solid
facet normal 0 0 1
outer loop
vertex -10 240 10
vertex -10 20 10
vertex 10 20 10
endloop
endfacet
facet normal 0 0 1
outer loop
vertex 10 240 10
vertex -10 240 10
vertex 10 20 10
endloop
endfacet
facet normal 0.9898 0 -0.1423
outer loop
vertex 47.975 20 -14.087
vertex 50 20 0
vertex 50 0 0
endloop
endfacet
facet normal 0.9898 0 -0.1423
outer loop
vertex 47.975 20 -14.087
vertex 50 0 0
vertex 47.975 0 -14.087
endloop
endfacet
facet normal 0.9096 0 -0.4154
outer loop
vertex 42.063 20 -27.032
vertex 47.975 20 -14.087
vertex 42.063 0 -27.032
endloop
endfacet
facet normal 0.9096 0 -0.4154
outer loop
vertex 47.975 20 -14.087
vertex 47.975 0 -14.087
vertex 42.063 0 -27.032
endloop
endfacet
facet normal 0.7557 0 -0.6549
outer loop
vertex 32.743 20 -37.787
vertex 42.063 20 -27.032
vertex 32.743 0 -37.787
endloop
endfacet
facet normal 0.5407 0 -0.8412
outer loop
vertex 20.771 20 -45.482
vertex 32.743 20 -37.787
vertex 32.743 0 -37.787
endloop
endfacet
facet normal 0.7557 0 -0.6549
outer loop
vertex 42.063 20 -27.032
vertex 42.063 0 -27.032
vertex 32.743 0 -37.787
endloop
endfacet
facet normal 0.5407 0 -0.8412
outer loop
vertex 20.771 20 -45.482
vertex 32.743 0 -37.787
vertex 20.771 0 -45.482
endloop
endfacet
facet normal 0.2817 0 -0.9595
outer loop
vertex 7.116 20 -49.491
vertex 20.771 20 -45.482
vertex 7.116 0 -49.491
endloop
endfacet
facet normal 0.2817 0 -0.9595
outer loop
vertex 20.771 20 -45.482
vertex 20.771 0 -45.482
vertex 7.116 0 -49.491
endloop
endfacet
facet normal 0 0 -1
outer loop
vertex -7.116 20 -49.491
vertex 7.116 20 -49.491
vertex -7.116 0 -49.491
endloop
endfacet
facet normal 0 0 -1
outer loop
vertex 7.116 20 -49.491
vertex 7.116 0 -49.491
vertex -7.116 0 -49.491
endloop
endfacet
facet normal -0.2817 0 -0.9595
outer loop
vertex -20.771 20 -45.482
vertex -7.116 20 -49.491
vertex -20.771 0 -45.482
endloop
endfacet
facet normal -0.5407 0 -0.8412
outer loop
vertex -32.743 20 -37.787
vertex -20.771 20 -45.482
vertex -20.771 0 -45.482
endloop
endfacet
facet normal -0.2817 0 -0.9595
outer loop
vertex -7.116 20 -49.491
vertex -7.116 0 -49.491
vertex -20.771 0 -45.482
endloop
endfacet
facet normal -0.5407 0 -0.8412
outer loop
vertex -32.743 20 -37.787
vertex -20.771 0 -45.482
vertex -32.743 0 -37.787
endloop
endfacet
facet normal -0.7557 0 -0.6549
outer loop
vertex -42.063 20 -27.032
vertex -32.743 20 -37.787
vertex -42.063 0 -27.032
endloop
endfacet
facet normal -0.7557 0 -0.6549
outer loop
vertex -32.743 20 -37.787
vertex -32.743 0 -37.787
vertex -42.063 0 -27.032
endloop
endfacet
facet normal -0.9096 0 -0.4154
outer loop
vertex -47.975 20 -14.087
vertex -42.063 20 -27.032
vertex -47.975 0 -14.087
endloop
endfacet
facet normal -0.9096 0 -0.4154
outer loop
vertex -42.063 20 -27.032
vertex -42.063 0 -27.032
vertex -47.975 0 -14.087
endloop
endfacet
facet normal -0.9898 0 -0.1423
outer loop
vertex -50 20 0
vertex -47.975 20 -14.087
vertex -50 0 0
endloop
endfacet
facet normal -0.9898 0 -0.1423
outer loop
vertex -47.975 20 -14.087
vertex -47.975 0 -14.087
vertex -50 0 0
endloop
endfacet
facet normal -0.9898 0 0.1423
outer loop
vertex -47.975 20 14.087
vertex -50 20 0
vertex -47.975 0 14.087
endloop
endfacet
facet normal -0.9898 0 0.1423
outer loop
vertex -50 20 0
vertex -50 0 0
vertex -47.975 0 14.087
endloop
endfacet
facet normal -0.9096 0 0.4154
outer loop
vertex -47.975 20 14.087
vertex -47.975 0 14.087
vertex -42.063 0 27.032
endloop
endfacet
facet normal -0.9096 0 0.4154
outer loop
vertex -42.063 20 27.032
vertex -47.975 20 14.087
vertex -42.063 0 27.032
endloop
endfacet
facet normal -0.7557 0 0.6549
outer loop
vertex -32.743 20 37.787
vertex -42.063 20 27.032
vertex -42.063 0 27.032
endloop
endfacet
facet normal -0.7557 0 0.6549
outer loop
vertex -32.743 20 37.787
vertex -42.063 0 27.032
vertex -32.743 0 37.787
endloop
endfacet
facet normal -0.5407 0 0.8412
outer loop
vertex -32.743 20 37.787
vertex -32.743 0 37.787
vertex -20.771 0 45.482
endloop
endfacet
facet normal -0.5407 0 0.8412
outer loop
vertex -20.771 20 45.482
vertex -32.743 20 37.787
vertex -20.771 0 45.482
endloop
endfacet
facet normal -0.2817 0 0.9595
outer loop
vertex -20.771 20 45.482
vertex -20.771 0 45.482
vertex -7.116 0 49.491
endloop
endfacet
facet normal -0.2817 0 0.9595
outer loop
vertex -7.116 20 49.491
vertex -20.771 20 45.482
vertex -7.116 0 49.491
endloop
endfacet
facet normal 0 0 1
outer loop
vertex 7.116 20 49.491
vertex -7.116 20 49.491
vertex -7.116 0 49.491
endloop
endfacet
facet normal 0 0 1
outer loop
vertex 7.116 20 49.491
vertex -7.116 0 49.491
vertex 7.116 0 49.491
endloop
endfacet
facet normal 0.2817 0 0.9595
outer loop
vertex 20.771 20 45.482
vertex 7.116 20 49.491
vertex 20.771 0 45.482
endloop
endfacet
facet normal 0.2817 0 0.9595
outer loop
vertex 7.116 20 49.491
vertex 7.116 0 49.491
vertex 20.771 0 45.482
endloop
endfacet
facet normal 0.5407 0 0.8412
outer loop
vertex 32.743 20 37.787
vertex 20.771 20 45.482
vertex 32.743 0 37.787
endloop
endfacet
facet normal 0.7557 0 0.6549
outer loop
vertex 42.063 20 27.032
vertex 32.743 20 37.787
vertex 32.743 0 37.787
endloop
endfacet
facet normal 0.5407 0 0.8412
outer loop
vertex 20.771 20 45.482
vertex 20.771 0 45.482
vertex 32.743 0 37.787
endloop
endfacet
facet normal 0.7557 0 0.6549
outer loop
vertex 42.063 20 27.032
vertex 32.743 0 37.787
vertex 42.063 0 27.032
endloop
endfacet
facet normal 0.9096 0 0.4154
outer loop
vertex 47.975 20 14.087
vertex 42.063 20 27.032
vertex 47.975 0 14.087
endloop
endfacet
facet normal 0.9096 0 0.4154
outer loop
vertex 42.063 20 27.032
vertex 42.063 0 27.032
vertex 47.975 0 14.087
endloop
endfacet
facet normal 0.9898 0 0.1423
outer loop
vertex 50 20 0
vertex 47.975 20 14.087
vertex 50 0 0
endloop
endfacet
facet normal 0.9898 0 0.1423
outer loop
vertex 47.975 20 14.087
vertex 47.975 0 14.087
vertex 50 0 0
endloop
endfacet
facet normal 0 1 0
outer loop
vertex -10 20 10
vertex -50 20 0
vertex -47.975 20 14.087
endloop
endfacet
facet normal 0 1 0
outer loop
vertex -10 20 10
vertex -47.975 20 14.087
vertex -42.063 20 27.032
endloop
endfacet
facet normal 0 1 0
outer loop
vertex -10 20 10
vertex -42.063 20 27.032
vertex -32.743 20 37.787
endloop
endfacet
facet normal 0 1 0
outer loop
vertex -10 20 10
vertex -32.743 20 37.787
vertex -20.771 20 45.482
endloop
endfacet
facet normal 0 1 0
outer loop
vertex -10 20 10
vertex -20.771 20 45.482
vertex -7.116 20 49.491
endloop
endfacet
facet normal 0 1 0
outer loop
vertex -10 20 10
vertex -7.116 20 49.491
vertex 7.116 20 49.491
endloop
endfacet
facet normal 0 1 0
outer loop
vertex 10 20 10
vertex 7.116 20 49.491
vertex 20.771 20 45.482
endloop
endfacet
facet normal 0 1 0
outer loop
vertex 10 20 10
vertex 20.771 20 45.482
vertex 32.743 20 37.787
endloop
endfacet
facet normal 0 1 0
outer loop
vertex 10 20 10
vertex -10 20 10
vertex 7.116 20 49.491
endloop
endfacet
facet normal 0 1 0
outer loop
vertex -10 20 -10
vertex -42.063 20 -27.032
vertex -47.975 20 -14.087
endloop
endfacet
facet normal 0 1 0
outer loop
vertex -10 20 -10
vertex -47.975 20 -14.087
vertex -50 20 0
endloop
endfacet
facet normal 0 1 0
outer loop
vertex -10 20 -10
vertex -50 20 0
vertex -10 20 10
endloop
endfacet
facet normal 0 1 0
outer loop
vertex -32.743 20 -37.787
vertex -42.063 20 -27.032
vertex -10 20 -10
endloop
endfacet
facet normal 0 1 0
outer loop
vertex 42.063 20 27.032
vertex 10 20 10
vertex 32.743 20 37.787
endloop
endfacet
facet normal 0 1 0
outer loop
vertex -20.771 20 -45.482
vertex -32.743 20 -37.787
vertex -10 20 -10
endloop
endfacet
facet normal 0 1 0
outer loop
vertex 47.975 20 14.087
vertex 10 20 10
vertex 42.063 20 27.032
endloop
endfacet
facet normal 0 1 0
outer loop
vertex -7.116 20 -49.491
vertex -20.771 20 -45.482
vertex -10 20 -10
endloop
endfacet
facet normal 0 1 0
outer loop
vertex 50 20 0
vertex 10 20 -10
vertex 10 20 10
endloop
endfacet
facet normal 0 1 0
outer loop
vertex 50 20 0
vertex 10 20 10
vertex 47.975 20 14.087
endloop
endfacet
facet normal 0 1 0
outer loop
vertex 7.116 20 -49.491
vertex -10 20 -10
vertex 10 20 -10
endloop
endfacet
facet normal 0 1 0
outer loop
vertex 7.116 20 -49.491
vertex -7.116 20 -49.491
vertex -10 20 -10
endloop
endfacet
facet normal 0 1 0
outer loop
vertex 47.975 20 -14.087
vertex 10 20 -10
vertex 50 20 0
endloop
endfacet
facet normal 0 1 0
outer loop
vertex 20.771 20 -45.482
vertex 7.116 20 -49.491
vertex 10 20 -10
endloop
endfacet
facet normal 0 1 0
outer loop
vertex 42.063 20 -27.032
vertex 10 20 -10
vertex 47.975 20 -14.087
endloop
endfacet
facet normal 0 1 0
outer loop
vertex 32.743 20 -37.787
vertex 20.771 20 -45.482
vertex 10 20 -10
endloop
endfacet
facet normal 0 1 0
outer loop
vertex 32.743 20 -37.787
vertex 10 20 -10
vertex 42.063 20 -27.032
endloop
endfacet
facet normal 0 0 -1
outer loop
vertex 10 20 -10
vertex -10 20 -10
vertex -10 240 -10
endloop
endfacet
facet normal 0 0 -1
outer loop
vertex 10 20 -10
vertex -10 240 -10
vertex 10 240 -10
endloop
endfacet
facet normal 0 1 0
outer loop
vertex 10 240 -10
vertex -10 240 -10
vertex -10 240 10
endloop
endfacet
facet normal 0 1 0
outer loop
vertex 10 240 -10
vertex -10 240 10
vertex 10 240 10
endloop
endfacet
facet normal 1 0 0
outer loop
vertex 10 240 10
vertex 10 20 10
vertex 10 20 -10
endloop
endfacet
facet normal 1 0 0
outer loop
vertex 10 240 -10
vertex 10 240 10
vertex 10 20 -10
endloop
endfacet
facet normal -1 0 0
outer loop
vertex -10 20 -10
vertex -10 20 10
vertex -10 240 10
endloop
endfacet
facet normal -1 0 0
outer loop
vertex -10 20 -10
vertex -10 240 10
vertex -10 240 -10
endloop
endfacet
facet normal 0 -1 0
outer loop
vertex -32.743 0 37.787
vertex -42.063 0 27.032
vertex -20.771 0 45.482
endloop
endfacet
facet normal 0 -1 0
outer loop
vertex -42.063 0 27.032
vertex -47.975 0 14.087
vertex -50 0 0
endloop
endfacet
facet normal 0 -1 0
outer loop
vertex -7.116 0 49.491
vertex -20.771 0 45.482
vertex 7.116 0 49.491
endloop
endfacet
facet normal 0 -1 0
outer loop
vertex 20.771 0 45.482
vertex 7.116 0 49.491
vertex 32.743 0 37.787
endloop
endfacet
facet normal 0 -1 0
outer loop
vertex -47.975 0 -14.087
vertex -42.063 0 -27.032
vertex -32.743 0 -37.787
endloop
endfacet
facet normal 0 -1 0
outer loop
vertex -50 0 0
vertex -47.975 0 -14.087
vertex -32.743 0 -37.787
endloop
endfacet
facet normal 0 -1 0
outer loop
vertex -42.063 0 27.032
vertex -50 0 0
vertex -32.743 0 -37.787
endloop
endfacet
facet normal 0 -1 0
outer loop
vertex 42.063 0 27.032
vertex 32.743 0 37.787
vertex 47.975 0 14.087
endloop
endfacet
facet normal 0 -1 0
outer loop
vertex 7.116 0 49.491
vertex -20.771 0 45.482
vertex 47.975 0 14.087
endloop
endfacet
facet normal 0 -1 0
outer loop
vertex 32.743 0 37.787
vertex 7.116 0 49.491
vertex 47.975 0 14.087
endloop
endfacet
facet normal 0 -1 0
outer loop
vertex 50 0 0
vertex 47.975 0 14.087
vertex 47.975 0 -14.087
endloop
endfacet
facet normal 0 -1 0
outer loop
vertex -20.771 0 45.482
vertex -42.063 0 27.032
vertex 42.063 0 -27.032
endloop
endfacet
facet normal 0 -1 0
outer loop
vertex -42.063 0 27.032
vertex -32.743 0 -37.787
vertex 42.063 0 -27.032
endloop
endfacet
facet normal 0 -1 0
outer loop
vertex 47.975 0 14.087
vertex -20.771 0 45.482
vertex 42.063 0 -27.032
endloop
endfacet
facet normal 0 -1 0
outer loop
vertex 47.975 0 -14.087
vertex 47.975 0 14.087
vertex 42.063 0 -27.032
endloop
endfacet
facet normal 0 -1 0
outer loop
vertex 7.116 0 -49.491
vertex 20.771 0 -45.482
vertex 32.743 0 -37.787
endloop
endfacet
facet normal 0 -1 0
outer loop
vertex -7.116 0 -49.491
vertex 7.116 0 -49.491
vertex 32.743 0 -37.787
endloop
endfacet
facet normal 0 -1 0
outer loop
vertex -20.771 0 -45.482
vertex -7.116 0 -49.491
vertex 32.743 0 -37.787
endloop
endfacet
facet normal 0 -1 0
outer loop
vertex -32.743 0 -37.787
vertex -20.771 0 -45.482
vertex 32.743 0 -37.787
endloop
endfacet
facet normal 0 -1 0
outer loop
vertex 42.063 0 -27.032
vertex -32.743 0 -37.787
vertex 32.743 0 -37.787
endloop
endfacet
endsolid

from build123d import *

# Parameters (mm, degrees)
SKETCH1_R           = 50
SKETCH1_W           = 20
SKETCH1_H           = 20
BOSS_EXTRUDE1_DEPTH = 20
SKETCH1_2_W         = 20
SKETCH1_2_H         = 20
BOSS_EXTRUDE2_DEPTH = 240


with BuildPart() as part:
    # Sketch1 → Boss-Extrude1 (new body)
    with BuildSketch(Plane(origin=(0, 0, 0), x_dir=(1, 0, 0), z_dir=(0, 1, 0))):
        Circle(SKETCH1_R)
        Rectangle(SKETCH1_W, SKETCH1_H, mode=Mode.SUBTRACT)
    extrude(amount=BOSS_EXTRUDE1_DEPTH)

    # Sketch1<2> → Boss-Extrude2 (add)
    with BuildSketch(Plane(origin=(0, 0, 0), x_dir=(1, 0, 0), z_dir=(0, 1, 0))):
        Rectangle(SKETCH1_2_W, SKETCH1_2_H)
    extrude(amount=BOSS_EXTRUDE2_DEPTH)


solid = part.part
